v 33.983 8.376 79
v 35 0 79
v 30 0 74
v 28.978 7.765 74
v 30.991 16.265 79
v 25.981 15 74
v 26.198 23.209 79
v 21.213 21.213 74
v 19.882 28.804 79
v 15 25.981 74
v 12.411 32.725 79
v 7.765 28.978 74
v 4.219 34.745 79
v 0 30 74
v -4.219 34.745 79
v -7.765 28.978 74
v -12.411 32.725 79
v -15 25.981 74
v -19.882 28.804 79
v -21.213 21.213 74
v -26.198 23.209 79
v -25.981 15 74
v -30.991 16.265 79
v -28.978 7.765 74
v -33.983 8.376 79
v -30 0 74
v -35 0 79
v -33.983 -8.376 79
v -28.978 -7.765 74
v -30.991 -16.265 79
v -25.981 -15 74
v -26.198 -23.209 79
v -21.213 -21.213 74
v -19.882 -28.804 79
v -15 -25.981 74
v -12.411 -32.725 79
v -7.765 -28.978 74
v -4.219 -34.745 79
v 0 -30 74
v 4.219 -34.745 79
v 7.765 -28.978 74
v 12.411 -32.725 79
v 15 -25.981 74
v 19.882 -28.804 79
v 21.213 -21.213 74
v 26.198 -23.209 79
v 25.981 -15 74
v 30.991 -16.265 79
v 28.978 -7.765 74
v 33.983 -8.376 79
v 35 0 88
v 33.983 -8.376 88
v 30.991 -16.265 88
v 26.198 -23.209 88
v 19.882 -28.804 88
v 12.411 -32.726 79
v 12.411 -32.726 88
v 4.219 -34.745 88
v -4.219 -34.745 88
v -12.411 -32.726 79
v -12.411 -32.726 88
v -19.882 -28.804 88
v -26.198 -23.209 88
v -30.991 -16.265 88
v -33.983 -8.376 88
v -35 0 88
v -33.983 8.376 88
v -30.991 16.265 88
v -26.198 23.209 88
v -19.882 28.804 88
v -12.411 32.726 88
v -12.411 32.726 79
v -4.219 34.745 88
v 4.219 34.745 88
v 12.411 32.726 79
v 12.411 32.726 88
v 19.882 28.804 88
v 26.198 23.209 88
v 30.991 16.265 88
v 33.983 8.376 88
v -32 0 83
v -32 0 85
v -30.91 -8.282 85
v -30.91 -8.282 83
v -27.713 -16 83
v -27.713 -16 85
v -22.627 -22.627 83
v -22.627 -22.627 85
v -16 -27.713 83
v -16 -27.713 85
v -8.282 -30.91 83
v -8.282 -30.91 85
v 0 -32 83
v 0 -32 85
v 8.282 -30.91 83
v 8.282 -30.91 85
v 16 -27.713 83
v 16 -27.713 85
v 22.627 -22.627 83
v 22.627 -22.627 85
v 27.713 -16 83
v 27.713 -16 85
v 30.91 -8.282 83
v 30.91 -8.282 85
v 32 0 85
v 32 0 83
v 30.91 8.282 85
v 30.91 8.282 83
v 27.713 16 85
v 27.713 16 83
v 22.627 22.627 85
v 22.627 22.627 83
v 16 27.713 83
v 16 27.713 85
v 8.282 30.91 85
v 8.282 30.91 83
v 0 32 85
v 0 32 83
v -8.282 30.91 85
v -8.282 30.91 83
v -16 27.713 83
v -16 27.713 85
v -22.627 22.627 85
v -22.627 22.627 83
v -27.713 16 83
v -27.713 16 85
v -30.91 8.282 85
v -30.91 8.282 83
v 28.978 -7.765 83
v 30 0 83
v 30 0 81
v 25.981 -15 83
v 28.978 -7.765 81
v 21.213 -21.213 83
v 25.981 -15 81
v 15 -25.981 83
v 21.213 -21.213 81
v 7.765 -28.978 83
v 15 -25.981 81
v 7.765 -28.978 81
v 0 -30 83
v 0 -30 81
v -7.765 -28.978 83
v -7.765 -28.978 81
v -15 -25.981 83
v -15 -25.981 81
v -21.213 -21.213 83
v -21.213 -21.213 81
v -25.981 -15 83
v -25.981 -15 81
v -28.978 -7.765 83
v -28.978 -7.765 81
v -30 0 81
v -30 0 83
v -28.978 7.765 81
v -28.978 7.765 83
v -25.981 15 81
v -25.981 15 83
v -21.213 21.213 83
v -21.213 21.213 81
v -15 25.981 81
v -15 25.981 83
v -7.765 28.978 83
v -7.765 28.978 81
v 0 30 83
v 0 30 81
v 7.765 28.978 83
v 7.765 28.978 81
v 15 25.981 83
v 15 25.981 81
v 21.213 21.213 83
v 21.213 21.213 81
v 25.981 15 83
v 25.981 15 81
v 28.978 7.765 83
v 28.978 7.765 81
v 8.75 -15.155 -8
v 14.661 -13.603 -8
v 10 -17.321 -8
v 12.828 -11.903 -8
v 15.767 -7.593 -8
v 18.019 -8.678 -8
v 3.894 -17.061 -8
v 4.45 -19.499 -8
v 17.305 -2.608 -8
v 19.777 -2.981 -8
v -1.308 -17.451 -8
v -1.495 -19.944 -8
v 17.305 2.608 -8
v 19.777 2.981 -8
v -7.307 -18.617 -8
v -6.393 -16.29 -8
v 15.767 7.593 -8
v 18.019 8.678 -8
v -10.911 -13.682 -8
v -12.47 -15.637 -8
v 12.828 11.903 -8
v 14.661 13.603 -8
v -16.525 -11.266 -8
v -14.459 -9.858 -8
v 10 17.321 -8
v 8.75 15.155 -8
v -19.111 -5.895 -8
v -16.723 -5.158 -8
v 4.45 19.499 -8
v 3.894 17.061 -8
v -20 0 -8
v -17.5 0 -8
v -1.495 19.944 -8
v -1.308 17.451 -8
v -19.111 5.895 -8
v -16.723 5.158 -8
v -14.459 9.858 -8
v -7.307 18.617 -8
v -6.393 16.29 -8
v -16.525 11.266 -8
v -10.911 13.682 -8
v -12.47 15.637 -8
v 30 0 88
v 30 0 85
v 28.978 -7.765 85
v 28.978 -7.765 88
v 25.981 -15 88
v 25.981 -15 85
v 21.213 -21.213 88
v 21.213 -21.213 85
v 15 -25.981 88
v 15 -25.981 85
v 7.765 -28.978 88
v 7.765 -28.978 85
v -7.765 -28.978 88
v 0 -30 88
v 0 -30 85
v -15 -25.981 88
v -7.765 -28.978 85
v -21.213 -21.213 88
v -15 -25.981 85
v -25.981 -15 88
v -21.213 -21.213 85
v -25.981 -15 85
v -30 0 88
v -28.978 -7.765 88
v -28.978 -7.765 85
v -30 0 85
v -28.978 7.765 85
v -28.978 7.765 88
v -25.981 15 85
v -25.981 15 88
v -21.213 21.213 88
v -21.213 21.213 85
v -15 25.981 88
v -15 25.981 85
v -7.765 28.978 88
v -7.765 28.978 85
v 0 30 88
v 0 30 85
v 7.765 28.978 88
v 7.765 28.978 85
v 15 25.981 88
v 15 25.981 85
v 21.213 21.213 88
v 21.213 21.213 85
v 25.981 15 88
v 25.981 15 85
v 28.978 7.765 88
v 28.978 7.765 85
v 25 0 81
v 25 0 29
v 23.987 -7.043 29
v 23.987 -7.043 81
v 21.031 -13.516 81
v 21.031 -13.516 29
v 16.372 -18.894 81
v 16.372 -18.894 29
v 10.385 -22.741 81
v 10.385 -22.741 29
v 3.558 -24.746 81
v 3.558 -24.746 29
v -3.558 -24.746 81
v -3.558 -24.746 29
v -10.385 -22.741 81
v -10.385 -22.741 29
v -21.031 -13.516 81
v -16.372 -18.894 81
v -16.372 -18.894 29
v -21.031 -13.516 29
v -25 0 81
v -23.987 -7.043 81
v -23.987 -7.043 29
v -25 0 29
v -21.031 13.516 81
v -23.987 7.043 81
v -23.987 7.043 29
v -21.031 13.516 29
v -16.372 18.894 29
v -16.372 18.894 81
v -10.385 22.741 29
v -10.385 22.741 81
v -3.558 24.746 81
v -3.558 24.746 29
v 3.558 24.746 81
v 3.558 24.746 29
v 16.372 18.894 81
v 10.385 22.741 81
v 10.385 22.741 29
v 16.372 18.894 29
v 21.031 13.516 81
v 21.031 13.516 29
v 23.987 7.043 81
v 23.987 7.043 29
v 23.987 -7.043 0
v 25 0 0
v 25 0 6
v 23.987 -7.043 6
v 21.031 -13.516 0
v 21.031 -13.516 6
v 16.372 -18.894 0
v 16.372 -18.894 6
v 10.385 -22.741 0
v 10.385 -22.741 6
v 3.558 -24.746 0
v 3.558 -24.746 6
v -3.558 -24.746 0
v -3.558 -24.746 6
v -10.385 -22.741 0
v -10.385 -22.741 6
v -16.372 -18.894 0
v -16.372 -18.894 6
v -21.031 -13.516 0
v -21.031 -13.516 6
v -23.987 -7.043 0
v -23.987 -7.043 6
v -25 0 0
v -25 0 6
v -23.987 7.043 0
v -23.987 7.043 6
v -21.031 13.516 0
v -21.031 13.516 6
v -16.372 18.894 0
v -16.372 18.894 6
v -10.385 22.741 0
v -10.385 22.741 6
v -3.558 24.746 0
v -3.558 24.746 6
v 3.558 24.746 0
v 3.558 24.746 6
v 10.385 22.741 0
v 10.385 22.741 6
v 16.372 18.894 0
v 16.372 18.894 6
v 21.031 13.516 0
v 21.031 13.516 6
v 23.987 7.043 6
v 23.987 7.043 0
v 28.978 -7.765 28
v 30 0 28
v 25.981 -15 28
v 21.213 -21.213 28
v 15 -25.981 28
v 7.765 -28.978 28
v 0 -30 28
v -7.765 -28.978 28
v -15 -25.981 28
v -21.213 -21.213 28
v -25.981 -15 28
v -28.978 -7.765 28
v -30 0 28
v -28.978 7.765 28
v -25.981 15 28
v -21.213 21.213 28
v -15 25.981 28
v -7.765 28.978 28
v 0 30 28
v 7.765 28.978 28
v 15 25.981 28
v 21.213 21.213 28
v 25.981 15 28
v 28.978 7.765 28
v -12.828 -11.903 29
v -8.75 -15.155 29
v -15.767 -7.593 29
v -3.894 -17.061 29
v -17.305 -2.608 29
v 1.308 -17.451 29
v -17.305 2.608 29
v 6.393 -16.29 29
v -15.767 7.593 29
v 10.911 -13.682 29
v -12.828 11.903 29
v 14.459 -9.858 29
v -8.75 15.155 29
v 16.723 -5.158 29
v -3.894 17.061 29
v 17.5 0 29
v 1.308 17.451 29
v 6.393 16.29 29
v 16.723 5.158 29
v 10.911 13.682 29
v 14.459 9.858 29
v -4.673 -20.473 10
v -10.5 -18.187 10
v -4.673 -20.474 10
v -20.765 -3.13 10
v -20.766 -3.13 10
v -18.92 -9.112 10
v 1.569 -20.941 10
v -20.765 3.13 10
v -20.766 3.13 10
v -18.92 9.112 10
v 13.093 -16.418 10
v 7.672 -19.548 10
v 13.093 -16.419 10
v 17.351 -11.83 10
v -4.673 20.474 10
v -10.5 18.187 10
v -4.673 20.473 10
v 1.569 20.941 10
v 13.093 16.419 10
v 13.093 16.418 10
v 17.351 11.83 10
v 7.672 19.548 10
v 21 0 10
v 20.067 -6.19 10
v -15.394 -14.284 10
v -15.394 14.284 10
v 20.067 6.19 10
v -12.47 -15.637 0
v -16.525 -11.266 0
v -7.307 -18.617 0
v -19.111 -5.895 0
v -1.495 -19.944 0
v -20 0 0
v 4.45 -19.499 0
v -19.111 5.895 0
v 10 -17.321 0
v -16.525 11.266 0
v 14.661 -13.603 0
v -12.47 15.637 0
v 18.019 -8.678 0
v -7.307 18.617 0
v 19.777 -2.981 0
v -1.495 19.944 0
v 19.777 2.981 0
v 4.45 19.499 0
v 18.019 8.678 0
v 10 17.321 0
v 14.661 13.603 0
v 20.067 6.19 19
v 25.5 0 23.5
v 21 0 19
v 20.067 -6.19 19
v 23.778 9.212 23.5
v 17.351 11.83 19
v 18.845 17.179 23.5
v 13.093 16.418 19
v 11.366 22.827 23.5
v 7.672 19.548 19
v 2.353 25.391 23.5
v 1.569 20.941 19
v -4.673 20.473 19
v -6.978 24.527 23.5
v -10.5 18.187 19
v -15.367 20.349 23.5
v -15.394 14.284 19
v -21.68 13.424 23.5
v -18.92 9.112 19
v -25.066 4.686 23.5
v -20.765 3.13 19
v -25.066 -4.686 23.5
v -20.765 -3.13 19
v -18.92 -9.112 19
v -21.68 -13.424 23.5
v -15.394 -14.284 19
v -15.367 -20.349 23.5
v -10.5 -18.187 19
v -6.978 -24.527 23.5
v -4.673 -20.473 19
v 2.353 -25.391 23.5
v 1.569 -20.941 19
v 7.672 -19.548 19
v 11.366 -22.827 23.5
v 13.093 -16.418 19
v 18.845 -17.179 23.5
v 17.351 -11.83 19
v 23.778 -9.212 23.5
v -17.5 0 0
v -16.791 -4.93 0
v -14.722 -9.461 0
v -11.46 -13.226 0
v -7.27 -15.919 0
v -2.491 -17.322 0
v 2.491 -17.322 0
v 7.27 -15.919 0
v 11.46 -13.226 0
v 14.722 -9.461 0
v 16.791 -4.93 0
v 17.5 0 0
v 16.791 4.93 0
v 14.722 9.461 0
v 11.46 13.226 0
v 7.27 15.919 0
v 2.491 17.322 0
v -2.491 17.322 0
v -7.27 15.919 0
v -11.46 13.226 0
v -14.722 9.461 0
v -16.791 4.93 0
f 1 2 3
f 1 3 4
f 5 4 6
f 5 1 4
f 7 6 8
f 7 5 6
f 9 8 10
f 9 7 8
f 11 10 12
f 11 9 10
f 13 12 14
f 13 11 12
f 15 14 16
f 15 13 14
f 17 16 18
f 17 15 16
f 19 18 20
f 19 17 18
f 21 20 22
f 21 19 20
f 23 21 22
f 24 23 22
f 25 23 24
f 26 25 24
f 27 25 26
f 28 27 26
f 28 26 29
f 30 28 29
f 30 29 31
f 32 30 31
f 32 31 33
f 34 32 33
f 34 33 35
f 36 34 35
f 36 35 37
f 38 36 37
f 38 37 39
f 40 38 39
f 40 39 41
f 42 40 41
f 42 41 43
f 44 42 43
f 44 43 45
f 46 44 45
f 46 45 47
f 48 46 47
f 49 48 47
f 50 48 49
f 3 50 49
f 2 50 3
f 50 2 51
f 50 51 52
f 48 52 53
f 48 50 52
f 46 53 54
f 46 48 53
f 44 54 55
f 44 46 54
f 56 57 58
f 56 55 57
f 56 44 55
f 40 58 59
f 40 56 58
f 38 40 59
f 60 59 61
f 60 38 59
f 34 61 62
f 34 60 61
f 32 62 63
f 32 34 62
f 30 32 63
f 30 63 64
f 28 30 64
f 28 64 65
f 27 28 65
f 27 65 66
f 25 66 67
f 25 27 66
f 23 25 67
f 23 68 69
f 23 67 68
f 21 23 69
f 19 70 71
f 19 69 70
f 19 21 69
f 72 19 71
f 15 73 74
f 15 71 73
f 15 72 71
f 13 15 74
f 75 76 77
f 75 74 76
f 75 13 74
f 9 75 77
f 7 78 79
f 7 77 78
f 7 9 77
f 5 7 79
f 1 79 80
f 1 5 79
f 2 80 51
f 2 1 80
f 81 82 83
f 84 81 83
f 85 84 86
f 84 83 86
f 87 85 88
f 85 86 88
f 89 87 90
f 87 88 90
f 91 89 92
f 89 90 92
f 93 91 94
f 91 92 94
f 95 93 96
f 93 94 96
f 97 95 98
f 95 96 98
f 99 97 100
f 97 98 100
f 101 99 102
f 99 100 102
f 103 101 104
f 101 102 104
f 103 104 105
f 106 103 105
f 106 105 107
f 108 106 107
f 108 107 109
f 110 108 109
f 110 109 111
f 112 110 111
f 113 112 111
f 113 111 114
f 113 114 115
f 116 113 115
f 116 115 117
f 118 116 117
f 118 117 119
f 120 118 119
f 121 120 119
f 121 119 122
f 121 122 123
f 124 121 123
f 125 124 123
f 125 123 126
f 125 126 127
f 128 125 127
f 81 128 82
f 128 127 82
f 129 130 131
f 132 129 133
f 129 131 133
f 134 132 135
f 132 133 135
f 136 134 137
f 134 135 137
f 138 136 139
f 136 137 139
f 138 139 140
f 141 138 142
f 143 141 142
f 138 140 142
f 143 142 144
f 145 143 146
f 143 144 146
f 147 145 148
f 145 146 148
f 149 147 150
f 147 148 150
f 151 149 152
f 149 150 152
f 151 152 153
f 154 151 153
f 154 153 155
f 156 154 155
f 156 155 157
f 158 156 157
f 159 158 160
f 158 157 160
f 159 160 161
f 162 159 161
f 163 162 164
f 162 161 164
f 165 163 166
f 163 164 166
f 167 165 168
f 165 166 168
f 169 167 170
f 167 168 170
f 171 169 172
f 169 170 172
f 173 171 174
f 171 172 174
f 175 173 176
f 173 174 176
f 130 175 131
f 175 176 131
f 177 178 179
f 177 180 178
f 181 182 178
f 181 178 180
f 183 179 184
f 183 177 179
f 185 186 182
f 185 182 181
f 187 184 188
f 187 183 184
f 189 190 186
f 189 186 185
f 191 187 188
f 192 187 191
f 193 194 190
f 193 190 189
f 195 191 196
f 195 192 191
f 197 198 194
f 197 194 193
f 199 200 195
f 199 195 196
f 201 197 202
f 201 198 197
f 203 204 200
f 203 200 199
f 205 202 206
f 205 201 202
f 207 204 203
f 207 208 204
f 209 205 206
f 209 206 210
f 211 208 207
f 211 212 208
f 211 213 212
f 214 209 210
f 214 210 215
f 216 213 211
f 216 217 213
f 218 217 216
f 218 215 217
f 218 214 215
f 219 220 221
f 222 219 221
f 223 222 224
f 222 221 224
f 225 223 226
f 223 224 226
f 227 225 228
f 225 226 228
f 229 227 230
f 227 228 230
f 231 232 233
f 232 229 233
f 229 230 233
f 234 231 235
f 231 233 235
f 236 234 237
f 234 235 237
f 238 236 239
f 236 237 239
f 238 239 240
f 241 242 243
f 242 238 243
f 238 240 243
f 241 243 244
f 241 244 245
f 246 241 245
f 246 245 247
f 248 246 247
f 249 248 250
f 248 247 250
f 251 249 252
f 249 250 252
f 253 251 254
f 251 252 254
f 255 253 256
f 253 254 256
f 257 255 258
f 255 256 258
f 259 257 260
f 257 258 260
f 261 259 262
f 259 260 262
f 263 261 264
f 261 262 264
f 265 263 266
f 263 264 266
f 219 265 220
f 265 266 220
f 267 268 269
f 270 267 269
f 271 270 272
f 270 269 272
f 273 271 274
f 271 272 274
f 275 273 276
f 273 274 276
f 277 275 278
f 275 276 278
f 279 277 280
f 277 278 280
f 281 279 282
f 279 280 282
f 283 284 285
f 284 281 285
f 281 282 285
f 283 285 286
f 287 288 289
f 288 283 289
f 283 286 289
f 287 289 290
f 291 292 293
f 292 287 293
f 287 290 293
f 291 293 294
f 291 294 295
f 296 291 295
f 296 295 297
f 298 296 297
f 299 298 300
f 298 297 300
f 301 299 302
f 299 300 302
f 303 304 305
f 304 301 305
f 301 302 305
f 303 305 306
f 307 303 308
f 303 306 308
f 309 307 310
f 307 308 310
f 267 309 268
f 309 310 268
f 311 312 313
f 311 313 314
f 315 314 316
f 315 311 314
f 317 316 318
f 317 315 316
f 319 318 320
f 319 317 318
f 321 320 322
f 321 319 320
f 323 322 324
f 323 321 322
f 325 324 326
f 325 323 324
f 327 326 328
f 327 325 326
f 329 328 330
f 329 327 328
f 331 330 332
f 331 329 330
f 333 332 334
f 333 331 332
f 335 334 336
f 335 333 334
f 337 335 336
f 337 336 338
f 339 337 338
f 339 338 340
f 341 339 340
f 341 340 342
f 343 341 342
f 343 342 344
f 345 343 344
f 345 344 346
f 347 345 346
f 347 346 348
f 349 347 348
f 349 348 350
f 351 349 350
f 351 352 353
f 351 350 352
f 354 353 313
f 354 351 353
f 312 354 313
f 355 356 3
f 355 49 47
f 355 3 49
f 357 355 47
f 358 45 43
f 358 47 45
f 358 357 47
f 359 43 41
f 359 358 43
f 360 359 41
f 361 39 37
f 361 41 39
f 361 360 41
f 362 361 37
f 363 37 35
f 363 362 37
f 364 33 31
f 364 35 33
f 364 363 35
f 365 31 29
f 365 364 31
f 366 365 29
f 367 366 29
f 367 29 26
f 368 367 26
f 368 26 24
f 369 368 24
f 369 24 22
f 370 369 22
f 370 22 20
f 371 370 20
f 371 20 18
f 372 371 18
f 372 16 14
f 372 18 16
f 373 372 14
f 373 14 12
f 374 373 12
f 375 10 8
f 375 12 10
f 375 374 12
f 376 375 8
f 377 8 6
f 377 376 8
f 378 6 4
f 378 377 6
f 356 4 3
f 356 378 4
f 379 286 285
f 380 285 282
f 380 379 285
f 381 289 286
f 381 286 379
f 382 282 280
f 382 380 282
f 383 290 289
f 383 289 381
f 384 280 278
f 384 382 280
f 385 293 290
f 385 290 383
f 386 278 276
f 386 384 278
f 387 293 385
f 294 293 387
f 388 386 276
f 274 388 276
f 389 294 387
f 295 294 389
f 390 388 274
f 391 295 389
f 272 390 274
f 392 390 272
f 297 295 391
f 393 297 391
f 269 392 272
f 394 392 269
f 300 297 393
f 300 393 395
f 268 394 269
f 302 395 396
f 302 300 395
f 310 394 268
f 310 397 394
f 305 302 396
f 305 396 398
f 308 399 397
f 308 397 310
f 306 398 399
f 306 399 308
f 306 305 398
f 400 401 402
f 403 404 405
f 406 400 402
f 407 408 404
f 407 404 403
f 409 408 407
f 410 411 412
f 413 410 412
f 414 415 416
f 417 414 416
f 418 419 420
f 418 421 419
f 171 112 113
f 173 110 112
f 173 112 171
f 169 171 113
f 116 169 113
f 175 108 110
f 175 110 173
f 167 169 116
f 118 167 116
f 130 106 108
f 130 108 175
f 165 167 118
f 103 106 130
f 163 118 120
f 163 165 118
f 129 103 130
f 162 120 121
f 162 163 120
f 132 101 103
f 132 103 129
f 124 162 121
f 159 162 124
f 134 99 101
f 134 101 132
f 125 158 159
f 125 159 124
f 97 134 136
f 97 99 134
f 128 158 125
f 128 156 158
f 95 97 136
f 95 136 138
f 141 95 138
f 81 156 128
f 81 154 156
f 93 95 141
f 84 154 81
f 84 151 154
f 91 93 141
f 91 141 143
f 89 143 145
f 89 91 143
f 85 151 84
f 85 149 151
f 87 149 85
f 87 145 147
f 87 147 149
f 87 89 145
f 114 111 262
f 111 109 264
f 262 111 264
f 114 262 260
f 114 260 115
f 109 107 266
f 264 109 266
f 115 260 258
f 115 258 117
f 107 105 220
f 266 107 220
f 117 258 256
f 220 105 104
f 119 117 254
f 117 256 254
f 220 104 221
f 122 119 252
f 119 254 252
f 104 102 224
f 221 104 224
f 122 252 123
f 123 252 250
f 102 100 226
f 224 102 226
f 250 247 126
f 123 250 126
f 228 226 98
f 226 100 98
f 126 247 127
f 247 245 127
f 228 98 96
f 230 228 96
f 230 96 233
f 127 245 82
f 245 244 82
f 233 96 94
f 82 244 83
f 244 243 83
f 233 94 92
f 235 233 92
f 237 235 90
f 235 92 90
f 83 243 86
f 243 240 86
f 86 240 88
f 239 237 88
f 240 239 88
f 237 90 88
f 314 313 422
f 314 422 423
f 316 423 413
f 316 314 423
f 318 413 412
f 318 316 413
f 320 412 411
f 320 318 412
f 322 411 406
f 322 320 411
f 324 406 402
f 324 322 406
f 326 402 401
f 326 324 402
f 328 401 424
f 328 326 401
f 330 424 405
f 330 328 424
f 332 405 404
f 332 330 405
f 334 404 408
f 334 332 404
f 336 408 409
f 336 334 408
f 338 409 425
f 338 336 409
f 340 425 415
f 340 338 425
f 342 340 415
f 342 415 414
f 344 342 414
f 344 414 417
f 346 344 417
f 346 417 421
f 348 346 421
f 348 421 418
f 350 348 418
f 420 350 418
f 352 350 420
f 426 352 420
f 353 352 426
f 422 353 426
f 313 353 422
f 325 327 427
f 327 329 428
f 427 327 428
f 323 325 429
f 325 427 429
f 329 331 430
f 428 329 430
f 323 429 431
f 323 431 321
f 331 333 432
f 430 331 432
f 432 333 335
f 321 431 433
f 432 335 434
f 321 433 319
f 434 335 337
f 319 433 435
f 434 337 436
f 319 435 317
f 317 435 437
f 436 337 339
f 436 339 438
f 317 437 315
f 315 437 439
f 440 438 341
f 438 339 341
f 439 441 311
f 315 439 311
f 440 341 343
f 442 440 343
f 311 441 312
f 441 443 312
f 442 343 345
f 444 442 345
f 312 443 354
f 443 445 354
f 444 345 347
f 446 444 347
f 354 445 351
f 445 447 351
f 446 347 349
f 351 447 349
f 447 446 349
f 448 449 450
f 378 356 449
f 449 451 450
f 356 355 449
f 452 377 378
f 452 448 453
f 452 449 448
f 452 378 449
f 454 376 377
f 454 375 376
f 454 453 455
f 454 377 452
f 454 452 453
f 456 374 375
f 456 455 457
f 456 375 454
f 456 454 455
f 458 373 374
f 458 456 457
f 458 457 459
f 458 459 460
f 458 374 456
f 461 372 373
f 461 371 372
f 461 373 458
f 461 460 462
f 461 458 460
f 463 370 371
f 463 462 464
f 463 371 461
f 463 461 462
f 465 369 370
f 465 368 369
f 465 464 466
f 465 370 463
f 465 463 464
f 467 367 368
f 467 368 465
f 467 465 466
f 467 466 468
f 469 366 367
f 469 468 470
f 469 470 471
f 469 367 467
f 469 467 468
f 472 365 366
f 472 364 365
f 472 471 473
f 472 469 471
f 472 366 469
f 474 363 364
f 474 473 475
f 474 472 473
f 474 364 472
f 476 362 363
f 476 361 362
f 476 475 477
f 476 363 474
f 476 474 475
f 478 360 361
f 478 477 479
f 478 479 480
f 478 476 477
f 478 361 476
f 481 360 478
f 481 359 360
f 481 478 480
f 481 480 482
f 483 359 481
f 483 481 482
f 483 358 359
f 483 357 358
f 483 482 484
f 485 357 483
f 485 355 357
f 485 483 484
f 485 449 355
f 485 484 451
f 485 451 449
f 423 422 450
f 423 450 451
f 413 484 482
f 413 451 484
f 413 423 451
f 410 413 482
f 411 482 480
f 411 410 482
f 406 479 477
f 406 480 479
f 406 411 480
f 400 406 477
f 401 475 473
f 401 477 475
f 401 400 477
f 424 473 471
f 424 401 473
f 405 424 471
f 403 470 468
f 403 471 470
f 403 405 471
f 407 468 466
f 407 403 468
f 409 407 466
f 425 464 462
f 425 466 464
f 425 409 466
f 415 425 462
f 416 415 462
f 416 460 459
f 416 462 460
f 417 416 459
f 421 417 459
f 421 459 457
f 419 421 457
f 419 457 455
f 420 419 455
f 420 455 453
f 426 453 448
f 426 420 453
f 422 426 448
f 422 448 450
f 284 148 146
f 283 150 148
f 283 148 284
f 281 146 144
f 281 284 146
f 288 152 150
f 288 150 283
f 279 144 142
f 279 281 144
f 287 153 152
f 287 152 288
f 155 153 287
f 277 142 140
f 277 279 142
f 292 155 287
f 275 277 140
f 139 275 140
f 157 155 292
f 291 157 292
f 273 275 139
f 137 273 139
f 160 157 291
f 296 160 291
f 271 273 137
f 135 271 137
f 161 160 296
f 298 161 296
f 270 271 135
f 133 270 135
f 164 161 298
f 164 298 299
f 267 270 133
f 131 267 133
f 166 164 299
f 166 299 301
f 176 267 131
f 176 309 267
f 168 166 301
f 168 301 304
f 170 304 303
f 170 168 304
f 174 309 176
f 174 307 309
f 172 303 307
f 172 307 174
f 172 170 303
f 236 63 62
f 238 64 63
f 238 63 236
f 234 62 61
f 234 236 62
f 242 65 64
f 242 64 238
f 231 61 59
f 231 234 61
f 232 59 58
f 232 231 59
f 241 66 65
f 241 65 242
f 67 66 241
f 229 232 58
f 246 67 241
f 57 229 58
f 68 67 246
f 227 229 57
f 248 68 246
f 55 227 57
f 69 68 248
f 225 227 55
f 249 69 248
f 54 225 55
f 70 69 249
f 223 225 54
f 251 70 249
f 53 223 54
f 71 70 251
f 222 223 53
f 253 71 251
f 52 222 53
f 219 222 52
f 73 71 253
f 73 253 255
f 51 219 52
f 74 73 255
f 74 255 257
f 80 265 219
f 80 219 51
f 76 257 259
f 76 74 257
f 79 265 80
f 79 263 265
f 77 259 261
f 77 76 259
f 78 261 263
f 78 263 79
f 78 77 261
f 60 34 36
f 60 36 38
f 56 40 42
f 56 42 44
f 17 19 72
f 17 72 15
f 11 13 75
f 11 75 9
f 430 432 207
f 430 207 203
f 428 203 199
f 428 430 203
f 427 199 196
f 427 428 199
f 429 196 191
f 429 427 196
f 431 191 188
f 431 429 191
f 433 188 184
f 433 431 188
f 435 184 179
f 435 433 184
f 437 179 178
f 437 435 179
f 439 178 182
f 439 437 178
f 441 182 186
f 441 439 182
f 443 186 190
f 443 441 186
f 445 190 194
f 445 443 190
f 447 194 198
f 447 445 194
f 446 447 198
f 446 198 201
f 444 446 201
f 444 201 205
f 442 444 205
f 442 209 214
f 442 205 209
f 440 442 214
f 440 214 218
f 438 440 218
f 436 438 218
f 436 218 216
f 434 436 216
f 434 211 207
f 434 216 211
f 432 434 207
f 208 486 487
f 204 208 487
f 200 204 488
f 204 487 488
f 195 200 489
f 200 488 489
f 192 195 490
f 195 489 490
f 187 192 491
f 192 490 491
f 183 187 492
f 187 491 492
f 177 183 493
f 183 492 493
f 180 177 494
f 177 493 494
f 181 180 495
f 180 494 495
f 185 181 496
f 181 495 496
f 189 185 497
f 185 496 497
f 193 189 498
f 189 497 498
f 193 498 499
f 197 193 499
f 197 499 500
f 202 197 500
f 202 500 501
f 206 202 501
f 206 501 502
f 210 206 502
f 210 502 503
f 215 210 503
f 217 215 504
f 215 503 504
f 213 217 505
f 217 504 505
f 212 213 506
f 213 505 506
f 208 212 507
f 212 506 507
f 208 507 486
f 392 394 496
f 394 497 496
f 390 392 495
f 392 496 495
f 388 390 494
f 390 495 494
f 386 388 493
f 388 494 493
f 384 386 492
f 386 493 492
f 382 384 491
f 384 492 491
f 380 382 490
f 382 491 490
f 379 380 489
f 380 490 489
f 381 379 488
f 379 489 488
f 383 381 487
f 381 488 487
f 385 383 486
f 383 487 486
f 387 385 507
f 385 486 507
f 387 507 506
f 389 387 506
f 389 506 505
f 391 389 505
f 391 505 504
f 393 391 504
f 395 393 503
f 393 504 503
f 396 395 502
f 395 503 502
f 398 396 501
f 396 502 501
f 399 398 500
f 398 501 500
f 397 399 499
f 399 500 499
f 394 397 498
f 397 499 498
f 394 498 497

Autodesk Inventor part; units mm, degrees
ref_plane "YZ Plane" through (0, 0, 0) normal (1, 0, 0) x (0, 1, 0)
ref_plane "XZ Plane" through (0, 0, 0) normal (0, 1, 0) x (-1, 0, 0)
ref_plane "XY Plane" through (0, 0, 0) normal (0, 0, 1) x (1, 0, 0)
sketch "Эскиз1" plane through (0, 0, 0) normal (0, 0, 1) x (1, 0, 0)
  circle A0 centre (0, 0) radius 17.5
  circle A1 centre (0, 0) radius 25
  dimension "d0" = 35
  dimension "d1" = 50
extrude "Выдавливание1" add sketch "Эскиз1" along normal blind 10
sketch "Эскиз2" plane through (0, 0, 10) normal (0, 0, 1) x (1, 0, 0)
  circle A0 centre (0, 0) radius 17.5 projected
  circle A1 centre (0, 0) radius 21
  dimension "d4" = 42
extrude "Выдавливание2" add sketch "Эскиз2" along normal blind 18
sketch "Эскиз5" plane through (0, 0, 28) normal (0, 0, 1) x (1, 0, 0)
  circle A0 centre (0, 0) radius 21 projected
  circle A1 centre (0, 0) radius 17.5 projected
  circle A2 centre (0, 0) radius 30
  dimension "d20" = 60
extrude "Выдавливание5" add sketch "Эскиз5" along normal blind 1 contours A0 | A2
sketch "Эскиз3" plane through (0, 0, 29) normal (0, 0, 1) x (1, 0, 0)
  circle A0 centre (0, 0) radius 21 projected
  circle A1 centre (0, 0) radius 30
  circle A2 centre (0, 0) radius 25
  dimension "d7" = 60
  dimension "d13" = 50
extrude "Выдавливание3" add sketch "Эскиз3" along normal blind 50 contours A1
chamfer "Фаска1" distance 4 angle 45 1 edges at (-25, 0, 10)
sketch "Эскиз4" plane through (0, 0, 0) normal (0, 0, -1) x (-1, 0, 0)
  circle A0 centre (0, 0) radius 17.5 projected
  circle A1 centre (0, 0) radius 20
  dimension "d17" = 40
extrude "Выдавливание4" add sketch "Эскиз4" along normal blind 8
chamfer "Фаска3" distance 9 angle 45 1 edges at (-21, 0, 28)
sketch "Эскиз6" plane through (0, 0, 79) normal (0, 0, 1) x (1, 0, 0)
  circle A0 centre (0, 0) radius 30 projected
  circle A1 centre (0, 0) radius 25 projected
  circle A2 centre (0, 0) radius 35
  dimension "d26" = 70
extrude "Выдавливание6" add sketch "Эскиз6" along normal blind 2 contours A0 | A2
sketch "Эскиз7" plane through (0, 0, 81) normal (0, 0, 1) x (1, 0, 0)
  circle A0 centre (0, 0) radius 35 projected
  circle A1 centre (0, 0) radius 30
  dimension "d29" = 60
extrude "Выдавливание7" add sketch "Эскиз7" along normal blind 7
chamfer "Фаска4" distance 5 angle 45 1 edges at (-30, 0, 79)
sketch "Эскиз8" plane through (0, 0, 0) normal (0, 1, 0) x (-1, 0, 0)
  line L0 (30, 81) -> (-30, 81) projected
  line L1 (30, 81) -> (30, 83)
  line L2 (30, 88) -> (30, 81) projected
  line L3 (30, 83) -> (32, 83)
  line L4 (32, 83) -> (32, 85)
  line L5 (32, 85) -> (30, 85)
  line L6 (0, -27.2) -> (0, 107.2) projected
  point P0 (0, 0)
  dimension "d35" = 2
  dimension "d36" = 2
  dimension "d37" = 2
revolve "Вращение1" cut sketch "Эскиз8" angle 360 about axis through (0, 0, -10) along (0, 0, 1)
properties part number "Для регулировки 3" material "Сталь, высокопрочная, низколегированная"
